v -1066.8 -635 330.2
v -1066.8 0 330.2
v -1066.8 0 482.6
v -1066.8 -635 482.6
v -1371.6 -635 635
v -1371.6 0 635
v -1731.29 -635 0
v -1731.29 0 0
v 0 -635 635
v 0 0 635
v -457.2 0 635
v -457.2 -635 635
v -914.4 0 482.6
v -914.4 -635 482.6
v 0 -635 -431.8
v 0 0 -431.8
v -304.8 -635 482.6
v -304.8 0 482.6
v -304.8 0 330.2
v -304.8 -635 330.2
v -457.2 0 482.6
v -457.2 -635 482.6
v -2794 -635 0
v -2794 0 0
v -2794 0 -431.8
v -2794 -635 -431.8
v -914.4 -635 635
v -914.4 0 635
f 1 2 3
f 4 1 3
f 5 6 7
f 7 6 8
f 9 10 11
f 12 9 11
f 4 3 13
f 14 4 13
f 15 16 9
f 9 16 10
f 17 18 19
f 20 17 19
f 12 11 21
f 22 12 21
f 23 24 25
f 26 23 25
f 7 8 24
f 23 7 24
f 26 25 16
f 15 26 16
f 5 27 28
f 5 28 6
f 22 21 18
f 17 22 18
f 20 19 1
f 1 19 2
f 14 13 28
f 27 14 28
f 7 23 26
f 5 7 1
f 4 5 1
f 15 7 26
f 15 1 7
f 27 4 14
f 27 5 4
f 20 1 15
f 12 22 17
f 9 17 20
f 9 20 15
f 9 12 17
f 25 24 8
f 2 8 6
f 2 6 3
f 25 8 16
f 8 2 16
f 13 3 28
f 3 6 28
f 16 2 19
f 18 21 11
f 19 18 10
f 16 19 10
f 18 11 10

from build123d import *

# Parameters (mm, degrees)
F2_DEPTH = 635
F3_DEPTH = 635


with BuildPart() as f2:
    # F1 (on face) → F2 (new body)
    with BuildSketch(Plane.XZ):
        Polygon((0, -431.8), (0, 0), (-1524, 0), (-1731.2896251678, 0), (-2540, 0), (-2794, 0), (-2794, -431.8), align=None)
        Polygon((-1524, 0), (0, 0), (0, 635), (-457.2, 635), (-457.2, 482.6), (-304.8, 482.6), (-304.8, 330.2), (-1066.8, 330.2), (-1066.8, 482.6), (-914.4, 482.6), (-914.4, 635), (-1371.6, 635), (-1731.2896251678, 0), align=None)
    extrude(amount=F2_DEPTH)

    # F0 (on Front) → F3 (join)
    with BuildSketch(Plane.XZ):
        Polygon((-1731.2896251678, 0), (0, 0), (0, 635), (-457.2, 635), (-457.2, 482.6), (-304.8, 482.6), (-304.8, 330.2), (-1066.8, 330.2), (-1066.8, 482.6), (-914.4, 482.6), (-914.4, 635), (-1371.6, 635), align=None)
    extrude(amount=F3_DEPTH)


solid = f2.part
